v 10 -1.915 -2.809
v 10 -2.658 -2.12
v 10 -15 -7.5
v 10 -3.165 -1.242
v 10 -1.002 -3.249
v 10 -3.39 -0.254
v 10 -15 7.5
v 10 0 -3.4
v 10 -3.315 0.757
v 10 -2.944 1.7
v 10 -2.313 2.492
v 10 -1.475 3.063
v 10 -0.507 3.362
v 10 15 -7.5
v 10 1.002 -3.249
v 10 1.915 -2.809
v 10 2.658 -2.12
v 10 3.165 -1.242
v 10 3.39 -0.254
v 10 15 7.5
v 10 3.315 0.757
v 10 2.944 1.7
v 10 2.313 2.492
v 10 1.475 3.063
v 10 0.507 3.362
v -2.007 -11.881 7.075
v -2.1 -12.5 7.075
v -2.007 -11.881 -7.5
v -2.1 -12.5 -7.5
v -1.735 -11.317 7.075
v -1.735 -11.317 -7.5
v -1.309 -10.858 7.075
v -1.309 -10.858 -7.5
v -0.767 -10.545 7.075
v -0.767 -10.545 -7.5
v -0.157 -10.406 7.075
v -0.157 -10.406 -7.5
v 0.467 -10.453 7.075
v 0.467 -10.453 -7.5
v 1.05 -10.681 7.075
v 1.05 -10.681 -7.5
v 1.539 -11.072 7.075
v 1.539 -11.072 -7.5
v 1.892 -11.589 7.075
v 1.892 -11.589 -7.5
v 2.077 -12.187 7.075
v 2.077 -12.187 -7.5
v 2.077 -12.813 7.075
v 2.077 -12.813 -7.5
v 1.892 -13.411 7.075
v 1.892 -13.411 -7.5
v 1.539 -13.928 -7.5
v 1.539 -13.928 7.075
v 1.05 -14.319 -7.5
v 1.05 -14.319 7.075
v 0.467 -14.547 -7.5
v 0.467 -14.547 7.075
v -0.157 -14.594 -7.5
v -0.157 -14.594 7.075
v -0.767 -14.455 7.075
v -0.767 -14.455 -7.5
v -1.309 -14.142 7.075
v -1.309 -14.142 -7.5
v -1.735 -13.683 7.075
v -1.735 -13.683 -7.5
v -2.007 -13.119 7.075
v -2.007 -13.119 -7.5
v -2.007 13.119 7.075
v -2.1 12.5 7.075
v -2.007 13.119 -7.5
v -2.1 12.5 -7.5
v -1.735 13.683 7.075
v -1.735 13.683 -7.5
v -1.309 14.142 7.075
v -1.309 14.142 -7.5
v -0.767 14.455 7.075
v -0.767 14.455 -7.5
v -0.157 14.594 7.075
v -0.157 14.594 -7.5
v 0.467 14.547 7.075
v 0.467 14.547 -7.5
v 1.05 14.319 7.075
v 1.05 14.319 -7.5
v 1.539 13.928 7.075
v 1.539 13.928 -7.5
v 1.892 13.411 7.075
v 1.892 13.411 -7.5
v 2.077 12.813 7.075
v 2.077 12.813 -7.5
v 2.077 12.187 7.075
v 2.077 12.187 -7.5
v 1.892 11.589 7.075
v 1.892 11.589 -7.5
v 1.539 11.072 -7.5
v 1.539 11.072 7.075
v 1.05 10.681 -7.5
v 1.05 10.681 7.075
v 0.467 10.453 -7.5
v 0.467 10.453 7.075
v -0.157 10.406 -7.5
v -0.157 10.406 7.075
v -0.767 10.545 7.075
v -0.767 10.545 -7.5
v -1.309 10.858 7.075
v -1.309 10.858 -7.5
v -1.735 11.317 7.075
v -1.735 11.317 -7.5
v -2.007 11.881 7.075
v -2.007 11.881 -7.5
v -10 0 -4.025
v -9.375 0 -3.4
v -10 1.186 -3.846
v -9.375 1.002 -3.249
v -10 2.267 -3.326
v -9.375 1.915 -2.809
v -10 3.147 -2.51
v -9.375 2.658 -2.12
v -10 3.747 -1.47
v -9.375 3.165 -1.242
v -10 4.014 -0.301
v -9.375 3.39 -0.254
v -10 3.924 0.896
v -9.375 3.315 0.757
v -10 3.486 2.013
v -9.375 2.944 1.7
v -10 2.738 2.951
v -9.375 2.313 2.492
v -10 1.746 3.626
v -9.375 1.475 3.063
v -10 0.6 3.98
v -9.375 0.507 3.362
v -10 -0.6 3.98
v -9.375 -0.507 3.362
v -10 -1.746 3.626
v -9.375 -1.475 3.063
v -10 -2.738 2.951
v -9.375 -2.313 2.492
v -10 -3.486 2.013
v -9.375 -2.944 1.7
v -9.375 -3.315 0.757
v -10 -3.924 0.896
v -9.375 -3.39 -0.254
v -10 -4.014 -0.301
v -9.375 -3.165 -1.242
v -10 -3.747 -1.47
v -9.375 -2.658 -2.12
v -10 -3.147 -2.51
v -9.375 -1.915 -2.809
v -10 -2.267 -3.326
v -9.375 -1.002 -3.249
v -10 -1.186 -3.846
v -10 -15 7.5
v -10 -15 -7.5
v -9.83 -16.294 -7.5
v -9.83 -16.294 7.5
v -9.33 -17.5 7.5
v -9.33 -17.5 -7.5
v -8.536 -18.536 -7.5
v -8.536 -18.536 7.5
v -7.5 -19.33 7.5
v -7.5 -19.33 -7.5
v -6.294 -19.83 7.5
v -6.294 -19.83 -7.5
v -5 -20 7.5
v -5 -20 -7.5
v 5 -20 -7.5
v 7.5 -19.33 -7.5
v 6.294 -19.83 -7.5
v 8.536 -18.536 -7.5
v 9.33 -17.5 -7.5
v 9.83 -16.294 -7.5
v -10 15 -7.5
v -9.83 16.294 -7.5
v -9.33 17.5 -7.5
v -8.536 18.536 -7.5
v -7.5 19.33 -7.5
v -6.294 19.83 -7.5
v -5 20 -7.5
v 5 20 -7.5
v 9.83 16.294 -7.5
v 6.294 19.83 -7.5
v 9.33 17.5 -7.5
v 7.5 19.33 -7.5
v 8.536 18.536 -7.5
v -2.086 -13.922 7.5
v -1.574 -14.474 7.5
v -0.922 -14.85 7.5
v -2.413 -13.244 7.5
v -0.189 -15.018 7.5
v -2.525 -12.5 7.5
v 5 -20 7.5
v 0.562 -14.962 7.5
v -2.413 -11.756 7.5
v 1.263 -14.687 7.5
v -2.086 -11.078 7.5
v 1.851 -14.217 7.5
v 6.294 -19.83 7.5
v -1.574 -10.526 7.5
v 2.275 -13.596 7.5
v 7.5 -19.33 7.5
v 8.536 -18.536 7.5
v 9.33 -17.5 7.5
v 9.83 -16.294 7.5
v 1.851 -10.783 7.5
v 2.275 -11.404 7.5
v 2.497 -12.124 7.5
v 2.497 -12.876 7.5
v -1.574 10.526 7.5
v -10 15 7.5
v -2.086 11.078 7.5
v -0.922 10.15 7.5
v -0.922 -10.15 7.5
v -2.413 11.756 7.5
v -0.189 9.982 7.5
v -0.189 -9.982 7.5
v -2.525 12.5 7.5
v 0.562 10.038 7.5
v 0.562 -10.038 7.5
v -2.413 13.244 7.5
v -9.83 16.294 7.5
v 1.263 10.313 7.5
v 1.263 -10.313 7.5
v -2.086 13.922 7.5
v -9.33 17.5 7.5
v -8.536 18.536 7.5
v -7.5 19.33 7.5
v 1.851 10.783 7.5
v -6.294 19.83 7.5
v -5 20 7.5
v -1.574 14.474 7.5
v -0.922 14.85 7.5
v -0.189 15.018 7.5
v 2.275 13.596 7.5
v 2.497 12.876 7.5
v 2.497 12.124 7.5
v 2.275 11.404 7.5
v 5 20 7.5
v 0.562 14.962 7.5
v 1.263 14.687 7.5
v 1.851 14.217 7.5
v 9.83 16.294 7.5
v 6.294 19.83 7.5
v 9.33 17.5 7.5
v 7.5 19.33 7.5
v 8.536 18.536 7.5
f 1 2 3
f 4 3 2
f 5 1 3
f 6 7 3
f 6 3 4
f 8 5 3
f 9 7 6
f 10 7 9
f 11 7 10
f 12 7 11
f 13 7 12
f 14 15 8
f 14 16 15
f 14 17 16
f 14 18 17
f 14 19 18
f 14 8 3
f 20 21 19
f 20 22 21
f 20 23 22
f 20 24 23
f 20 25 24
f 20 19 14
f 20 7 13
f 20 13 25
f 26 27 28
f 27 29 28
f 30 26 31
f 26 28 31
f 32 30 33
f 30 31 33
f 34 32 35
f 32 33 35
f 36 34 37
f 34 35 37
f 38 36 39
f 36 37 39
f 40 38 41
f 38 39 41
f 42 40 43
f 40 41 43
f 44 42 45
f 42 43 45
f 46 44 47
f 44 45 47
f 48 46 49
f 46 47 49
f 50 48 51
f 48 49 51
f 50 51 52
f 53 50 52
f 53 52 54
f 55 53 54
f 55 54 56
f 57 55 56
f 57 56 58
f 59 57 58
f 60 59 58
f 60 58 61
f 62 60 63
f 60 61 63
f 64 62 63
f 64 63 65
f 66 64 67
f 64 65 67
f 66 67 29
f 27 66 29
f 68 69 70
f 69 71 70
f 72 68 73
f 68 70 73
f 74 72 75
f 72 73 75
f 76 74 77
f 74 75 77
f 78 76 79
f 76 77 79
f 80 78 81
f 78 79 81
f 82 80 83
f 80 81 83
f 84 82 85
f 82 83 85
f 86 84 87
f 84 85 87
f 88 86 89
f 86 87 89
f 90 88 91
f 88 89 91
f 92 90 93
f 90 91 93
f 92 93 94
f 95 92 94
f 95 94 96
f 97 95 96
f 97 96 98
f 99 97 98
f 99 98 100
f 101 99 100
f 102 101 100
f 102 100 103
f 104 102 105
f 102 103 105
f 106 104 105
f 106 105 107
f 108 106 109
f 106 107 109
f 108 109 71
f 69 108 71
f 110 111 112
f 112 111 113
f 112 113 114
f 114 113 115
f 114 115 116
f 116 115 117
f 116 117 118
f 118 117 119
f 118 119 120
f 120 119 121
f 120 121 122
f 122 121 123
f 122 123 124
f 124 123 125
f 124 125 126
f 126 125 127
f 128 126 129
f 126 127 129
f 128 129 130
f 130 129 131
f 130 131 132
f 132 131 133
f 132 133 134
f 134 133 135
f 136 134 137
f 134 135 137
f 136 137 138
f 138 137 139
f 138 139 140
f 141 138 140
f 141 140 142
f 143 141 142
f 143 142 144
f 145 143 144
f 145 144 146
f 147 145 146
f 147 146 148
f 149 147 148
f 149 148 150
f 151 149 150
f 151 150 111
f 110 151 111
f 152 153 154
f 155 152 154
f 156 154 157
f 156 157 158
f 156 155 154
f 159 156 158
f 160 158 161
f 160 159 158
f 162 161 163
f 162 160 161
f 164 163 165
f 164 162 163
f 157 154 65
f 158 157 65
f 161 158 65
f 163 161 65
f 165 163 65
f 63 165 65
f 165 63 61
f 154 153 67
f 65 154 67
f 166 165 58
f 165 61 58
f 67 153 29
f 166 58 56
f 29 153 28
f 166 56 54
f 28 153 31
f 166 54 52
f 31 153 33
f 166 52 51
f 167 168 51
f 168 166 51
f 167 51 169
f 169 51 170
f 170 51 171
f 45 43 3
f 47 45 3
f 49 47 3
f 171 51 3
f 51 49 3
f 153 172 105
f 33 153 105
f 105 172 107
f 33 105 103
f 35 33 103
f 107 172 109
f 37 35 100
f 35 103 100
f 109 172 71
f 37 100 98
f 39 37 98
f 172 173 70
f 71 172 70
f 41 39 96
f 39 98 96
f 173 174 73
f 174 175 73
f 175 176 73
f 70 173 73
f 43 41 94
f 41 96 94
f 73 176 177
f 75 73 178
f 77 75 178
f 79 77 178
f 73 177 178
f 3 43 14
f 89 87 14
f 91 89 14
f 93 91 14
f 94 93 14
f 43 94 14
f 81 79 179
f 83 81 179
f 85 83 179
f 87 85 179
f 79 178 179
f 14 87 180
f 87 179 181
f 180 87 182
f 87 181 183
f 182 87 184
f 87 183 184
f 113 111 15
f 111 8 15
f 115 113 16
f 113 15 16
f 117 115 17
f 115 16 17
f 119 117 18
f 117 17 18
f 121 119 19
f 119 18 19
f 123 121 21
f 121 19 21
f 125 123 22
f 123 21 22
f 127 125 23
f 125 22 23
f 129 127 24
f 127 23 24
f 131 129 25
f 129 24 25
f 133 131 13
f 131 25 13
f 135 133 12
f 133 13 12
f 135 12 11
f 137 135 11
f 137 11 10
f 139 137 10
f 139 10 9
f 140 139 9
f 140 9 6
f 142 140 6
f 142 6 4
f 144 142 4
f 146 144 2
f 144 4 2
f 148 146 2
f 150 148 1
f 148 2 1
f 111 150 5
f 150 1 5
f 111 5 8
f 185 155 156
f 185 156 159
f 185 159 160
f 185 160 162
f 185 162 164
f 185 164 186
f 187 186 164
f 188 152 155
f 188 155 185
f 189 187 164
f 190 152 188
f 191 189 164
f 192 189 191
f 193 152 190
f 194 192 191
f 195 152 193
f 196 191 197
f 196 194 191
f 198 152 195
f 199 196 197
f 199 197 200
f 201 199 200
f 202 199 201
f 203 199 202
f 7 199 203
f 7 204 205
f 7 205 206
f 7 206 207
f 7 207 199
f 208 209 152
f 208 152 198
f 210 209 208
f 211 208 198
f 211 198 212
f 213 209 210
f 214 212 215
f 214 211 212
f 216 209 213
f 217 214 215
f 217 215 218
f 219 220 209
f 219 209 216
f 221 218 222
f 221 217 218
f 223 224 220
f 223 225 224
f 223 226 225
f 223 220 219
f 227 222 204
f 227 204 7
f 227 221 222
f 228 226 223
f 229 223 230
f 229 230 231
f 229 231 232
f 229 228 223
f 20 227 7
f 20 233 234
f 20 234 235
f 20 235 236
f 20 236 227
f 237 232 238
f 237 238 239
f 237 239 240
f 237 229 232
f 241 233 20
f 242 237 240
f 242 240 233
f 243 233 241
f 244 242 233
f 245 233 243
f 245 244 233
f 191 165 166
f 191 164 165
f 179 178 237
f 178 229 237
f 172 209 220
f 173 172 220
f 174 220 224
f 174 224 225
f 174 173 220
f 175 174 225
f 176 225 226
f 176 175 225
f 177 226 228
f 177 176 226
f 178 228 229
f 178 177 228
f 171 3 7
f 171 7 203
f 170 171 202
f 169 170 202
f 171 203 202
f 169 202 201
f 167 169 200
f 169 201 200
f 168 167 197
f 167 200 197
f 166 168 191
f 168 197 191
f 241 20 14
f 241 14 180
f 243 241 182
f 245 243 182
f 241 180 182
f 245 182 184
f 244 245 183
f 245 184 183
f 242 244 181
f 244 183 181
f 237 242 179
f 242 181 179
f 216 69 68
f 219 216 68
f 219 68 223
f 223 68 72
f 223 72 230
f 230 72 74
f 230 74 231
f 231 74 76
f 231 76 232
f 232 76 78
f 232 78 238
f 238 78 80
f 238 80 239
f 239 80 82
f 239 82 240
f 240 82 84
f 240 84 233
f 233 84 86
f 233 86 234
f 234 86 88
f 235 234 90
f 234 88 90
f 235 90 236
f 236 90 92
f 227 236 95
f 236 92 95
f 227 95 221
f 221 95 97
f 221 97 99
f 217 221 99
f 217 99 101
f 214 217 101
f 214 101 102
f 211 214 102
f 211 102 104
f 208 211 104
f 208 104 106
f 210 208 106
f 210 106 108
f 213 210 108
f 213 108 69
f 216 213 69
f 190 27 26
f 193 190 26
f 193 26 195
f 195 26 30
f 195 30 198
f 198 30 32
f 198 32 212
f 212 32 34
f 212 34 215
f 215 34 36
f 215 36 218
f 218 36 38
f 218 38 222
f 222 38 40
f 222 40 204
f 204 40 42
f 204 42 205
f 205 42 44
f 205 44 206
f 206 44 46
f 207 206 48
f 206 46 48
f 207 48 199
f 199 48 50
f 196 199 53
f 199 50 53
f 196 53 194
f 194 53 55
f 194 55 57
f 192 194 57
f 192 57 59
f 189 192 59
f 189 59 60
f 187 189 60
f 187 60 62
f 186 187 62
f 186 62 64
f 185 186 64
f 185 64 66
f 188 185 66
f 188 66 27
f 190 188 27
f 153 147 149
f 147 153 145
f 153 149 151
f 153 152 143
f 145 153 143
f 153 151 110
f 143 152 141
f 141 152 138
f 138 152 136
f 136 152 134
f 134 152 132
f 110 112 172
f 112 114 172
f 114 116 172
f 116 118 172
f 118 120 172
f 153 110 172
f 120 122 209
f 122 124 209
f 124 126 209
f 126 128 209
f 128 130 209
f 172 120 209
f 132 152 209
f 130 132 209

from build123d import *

# Parameters (mm, degrees)
SKETCH1_W                   = 20
SKETCH1_H                   = 40
BOSS_EXTRUDE1_DEPTH         = 7.5
FILLET1_R                   = 5
M5_TAPPED_HOLE1_D           = 4.2
M5_TAPPED_HOLE1_CSINK_D     = 5.05
M5_TAPPED_HOLE1_CSINK_ANGLE = 90
M8_TAPPED_HOLE1_D           = 6.8
M8_TAPPED_HOLE1_DEPTH       = 20
M8_TAPPED_HOLE1_CSINK_D     = 8.05
M8_TAPPED_HOLE1_CSINK_ANGLE = 90
M8_TAPPED_HOLE1_TIP         = 2.042926105


with BuildPart() as part:
    # Sketch1 → Boss-Extrude1 (new, symmetric)
    with BuildSketch(Plane.XY):
        Rectangle(SKETCH1_W, SKETCH1_H)
    extrude(amount=BOSS_EXTRUDE1_DEPTH, both=True)

    # Fillet1
    fillet1_edges = [part.edges().sort_by_distance(p)[0] for p in [
        (10, -20, 0),
        (-10, -20, 0),
        (-10, 20, 0),
        (10, 20, 0),
    ]]
    fillet(fillet1_edges, radius=FILLET1_R)

    # M5 Tapped Hole1 (through all)
    with Locations(Plane.XY.offset(7.5)):
        with Locations((0, 12.5), (0, -12.5)):
            CounterSinkHole(M5_TAPPED_HOLE1_D / 2, M5_TAPPED_HOLE1_CSINK_D / 2, counter_sink_angle=M5_TAPPED_HOLE1_CSINK_ANGLE)

    # M8 Tapped Hole1
    with Locations(Plane.ZY.offset(10)):
        with Locations((0, 0)):
            CounterSinkHole(M8_TAPPED_HOLE1_D / 2, M8_TAPPED_HOLE1_CSINK_D / 2, depth=M8_TAPPED_HOLE1_DEPTH, counter_sink_angle=M8_TAPPED_HOLE1_CSINK_ANGLE)
            with Locations((0, 0, -(M8_TAPPED_HOLE1_DEPTH + M8_TAPPED_HOLE1_TIP / 2))):  # 118° drill point
                Cone(0, M8_TAPPED_HOLE1_D / 2, M8_TAPPED_HOLE1_TIP, mode=Mode.SUBTRACT)


solid = part.part
